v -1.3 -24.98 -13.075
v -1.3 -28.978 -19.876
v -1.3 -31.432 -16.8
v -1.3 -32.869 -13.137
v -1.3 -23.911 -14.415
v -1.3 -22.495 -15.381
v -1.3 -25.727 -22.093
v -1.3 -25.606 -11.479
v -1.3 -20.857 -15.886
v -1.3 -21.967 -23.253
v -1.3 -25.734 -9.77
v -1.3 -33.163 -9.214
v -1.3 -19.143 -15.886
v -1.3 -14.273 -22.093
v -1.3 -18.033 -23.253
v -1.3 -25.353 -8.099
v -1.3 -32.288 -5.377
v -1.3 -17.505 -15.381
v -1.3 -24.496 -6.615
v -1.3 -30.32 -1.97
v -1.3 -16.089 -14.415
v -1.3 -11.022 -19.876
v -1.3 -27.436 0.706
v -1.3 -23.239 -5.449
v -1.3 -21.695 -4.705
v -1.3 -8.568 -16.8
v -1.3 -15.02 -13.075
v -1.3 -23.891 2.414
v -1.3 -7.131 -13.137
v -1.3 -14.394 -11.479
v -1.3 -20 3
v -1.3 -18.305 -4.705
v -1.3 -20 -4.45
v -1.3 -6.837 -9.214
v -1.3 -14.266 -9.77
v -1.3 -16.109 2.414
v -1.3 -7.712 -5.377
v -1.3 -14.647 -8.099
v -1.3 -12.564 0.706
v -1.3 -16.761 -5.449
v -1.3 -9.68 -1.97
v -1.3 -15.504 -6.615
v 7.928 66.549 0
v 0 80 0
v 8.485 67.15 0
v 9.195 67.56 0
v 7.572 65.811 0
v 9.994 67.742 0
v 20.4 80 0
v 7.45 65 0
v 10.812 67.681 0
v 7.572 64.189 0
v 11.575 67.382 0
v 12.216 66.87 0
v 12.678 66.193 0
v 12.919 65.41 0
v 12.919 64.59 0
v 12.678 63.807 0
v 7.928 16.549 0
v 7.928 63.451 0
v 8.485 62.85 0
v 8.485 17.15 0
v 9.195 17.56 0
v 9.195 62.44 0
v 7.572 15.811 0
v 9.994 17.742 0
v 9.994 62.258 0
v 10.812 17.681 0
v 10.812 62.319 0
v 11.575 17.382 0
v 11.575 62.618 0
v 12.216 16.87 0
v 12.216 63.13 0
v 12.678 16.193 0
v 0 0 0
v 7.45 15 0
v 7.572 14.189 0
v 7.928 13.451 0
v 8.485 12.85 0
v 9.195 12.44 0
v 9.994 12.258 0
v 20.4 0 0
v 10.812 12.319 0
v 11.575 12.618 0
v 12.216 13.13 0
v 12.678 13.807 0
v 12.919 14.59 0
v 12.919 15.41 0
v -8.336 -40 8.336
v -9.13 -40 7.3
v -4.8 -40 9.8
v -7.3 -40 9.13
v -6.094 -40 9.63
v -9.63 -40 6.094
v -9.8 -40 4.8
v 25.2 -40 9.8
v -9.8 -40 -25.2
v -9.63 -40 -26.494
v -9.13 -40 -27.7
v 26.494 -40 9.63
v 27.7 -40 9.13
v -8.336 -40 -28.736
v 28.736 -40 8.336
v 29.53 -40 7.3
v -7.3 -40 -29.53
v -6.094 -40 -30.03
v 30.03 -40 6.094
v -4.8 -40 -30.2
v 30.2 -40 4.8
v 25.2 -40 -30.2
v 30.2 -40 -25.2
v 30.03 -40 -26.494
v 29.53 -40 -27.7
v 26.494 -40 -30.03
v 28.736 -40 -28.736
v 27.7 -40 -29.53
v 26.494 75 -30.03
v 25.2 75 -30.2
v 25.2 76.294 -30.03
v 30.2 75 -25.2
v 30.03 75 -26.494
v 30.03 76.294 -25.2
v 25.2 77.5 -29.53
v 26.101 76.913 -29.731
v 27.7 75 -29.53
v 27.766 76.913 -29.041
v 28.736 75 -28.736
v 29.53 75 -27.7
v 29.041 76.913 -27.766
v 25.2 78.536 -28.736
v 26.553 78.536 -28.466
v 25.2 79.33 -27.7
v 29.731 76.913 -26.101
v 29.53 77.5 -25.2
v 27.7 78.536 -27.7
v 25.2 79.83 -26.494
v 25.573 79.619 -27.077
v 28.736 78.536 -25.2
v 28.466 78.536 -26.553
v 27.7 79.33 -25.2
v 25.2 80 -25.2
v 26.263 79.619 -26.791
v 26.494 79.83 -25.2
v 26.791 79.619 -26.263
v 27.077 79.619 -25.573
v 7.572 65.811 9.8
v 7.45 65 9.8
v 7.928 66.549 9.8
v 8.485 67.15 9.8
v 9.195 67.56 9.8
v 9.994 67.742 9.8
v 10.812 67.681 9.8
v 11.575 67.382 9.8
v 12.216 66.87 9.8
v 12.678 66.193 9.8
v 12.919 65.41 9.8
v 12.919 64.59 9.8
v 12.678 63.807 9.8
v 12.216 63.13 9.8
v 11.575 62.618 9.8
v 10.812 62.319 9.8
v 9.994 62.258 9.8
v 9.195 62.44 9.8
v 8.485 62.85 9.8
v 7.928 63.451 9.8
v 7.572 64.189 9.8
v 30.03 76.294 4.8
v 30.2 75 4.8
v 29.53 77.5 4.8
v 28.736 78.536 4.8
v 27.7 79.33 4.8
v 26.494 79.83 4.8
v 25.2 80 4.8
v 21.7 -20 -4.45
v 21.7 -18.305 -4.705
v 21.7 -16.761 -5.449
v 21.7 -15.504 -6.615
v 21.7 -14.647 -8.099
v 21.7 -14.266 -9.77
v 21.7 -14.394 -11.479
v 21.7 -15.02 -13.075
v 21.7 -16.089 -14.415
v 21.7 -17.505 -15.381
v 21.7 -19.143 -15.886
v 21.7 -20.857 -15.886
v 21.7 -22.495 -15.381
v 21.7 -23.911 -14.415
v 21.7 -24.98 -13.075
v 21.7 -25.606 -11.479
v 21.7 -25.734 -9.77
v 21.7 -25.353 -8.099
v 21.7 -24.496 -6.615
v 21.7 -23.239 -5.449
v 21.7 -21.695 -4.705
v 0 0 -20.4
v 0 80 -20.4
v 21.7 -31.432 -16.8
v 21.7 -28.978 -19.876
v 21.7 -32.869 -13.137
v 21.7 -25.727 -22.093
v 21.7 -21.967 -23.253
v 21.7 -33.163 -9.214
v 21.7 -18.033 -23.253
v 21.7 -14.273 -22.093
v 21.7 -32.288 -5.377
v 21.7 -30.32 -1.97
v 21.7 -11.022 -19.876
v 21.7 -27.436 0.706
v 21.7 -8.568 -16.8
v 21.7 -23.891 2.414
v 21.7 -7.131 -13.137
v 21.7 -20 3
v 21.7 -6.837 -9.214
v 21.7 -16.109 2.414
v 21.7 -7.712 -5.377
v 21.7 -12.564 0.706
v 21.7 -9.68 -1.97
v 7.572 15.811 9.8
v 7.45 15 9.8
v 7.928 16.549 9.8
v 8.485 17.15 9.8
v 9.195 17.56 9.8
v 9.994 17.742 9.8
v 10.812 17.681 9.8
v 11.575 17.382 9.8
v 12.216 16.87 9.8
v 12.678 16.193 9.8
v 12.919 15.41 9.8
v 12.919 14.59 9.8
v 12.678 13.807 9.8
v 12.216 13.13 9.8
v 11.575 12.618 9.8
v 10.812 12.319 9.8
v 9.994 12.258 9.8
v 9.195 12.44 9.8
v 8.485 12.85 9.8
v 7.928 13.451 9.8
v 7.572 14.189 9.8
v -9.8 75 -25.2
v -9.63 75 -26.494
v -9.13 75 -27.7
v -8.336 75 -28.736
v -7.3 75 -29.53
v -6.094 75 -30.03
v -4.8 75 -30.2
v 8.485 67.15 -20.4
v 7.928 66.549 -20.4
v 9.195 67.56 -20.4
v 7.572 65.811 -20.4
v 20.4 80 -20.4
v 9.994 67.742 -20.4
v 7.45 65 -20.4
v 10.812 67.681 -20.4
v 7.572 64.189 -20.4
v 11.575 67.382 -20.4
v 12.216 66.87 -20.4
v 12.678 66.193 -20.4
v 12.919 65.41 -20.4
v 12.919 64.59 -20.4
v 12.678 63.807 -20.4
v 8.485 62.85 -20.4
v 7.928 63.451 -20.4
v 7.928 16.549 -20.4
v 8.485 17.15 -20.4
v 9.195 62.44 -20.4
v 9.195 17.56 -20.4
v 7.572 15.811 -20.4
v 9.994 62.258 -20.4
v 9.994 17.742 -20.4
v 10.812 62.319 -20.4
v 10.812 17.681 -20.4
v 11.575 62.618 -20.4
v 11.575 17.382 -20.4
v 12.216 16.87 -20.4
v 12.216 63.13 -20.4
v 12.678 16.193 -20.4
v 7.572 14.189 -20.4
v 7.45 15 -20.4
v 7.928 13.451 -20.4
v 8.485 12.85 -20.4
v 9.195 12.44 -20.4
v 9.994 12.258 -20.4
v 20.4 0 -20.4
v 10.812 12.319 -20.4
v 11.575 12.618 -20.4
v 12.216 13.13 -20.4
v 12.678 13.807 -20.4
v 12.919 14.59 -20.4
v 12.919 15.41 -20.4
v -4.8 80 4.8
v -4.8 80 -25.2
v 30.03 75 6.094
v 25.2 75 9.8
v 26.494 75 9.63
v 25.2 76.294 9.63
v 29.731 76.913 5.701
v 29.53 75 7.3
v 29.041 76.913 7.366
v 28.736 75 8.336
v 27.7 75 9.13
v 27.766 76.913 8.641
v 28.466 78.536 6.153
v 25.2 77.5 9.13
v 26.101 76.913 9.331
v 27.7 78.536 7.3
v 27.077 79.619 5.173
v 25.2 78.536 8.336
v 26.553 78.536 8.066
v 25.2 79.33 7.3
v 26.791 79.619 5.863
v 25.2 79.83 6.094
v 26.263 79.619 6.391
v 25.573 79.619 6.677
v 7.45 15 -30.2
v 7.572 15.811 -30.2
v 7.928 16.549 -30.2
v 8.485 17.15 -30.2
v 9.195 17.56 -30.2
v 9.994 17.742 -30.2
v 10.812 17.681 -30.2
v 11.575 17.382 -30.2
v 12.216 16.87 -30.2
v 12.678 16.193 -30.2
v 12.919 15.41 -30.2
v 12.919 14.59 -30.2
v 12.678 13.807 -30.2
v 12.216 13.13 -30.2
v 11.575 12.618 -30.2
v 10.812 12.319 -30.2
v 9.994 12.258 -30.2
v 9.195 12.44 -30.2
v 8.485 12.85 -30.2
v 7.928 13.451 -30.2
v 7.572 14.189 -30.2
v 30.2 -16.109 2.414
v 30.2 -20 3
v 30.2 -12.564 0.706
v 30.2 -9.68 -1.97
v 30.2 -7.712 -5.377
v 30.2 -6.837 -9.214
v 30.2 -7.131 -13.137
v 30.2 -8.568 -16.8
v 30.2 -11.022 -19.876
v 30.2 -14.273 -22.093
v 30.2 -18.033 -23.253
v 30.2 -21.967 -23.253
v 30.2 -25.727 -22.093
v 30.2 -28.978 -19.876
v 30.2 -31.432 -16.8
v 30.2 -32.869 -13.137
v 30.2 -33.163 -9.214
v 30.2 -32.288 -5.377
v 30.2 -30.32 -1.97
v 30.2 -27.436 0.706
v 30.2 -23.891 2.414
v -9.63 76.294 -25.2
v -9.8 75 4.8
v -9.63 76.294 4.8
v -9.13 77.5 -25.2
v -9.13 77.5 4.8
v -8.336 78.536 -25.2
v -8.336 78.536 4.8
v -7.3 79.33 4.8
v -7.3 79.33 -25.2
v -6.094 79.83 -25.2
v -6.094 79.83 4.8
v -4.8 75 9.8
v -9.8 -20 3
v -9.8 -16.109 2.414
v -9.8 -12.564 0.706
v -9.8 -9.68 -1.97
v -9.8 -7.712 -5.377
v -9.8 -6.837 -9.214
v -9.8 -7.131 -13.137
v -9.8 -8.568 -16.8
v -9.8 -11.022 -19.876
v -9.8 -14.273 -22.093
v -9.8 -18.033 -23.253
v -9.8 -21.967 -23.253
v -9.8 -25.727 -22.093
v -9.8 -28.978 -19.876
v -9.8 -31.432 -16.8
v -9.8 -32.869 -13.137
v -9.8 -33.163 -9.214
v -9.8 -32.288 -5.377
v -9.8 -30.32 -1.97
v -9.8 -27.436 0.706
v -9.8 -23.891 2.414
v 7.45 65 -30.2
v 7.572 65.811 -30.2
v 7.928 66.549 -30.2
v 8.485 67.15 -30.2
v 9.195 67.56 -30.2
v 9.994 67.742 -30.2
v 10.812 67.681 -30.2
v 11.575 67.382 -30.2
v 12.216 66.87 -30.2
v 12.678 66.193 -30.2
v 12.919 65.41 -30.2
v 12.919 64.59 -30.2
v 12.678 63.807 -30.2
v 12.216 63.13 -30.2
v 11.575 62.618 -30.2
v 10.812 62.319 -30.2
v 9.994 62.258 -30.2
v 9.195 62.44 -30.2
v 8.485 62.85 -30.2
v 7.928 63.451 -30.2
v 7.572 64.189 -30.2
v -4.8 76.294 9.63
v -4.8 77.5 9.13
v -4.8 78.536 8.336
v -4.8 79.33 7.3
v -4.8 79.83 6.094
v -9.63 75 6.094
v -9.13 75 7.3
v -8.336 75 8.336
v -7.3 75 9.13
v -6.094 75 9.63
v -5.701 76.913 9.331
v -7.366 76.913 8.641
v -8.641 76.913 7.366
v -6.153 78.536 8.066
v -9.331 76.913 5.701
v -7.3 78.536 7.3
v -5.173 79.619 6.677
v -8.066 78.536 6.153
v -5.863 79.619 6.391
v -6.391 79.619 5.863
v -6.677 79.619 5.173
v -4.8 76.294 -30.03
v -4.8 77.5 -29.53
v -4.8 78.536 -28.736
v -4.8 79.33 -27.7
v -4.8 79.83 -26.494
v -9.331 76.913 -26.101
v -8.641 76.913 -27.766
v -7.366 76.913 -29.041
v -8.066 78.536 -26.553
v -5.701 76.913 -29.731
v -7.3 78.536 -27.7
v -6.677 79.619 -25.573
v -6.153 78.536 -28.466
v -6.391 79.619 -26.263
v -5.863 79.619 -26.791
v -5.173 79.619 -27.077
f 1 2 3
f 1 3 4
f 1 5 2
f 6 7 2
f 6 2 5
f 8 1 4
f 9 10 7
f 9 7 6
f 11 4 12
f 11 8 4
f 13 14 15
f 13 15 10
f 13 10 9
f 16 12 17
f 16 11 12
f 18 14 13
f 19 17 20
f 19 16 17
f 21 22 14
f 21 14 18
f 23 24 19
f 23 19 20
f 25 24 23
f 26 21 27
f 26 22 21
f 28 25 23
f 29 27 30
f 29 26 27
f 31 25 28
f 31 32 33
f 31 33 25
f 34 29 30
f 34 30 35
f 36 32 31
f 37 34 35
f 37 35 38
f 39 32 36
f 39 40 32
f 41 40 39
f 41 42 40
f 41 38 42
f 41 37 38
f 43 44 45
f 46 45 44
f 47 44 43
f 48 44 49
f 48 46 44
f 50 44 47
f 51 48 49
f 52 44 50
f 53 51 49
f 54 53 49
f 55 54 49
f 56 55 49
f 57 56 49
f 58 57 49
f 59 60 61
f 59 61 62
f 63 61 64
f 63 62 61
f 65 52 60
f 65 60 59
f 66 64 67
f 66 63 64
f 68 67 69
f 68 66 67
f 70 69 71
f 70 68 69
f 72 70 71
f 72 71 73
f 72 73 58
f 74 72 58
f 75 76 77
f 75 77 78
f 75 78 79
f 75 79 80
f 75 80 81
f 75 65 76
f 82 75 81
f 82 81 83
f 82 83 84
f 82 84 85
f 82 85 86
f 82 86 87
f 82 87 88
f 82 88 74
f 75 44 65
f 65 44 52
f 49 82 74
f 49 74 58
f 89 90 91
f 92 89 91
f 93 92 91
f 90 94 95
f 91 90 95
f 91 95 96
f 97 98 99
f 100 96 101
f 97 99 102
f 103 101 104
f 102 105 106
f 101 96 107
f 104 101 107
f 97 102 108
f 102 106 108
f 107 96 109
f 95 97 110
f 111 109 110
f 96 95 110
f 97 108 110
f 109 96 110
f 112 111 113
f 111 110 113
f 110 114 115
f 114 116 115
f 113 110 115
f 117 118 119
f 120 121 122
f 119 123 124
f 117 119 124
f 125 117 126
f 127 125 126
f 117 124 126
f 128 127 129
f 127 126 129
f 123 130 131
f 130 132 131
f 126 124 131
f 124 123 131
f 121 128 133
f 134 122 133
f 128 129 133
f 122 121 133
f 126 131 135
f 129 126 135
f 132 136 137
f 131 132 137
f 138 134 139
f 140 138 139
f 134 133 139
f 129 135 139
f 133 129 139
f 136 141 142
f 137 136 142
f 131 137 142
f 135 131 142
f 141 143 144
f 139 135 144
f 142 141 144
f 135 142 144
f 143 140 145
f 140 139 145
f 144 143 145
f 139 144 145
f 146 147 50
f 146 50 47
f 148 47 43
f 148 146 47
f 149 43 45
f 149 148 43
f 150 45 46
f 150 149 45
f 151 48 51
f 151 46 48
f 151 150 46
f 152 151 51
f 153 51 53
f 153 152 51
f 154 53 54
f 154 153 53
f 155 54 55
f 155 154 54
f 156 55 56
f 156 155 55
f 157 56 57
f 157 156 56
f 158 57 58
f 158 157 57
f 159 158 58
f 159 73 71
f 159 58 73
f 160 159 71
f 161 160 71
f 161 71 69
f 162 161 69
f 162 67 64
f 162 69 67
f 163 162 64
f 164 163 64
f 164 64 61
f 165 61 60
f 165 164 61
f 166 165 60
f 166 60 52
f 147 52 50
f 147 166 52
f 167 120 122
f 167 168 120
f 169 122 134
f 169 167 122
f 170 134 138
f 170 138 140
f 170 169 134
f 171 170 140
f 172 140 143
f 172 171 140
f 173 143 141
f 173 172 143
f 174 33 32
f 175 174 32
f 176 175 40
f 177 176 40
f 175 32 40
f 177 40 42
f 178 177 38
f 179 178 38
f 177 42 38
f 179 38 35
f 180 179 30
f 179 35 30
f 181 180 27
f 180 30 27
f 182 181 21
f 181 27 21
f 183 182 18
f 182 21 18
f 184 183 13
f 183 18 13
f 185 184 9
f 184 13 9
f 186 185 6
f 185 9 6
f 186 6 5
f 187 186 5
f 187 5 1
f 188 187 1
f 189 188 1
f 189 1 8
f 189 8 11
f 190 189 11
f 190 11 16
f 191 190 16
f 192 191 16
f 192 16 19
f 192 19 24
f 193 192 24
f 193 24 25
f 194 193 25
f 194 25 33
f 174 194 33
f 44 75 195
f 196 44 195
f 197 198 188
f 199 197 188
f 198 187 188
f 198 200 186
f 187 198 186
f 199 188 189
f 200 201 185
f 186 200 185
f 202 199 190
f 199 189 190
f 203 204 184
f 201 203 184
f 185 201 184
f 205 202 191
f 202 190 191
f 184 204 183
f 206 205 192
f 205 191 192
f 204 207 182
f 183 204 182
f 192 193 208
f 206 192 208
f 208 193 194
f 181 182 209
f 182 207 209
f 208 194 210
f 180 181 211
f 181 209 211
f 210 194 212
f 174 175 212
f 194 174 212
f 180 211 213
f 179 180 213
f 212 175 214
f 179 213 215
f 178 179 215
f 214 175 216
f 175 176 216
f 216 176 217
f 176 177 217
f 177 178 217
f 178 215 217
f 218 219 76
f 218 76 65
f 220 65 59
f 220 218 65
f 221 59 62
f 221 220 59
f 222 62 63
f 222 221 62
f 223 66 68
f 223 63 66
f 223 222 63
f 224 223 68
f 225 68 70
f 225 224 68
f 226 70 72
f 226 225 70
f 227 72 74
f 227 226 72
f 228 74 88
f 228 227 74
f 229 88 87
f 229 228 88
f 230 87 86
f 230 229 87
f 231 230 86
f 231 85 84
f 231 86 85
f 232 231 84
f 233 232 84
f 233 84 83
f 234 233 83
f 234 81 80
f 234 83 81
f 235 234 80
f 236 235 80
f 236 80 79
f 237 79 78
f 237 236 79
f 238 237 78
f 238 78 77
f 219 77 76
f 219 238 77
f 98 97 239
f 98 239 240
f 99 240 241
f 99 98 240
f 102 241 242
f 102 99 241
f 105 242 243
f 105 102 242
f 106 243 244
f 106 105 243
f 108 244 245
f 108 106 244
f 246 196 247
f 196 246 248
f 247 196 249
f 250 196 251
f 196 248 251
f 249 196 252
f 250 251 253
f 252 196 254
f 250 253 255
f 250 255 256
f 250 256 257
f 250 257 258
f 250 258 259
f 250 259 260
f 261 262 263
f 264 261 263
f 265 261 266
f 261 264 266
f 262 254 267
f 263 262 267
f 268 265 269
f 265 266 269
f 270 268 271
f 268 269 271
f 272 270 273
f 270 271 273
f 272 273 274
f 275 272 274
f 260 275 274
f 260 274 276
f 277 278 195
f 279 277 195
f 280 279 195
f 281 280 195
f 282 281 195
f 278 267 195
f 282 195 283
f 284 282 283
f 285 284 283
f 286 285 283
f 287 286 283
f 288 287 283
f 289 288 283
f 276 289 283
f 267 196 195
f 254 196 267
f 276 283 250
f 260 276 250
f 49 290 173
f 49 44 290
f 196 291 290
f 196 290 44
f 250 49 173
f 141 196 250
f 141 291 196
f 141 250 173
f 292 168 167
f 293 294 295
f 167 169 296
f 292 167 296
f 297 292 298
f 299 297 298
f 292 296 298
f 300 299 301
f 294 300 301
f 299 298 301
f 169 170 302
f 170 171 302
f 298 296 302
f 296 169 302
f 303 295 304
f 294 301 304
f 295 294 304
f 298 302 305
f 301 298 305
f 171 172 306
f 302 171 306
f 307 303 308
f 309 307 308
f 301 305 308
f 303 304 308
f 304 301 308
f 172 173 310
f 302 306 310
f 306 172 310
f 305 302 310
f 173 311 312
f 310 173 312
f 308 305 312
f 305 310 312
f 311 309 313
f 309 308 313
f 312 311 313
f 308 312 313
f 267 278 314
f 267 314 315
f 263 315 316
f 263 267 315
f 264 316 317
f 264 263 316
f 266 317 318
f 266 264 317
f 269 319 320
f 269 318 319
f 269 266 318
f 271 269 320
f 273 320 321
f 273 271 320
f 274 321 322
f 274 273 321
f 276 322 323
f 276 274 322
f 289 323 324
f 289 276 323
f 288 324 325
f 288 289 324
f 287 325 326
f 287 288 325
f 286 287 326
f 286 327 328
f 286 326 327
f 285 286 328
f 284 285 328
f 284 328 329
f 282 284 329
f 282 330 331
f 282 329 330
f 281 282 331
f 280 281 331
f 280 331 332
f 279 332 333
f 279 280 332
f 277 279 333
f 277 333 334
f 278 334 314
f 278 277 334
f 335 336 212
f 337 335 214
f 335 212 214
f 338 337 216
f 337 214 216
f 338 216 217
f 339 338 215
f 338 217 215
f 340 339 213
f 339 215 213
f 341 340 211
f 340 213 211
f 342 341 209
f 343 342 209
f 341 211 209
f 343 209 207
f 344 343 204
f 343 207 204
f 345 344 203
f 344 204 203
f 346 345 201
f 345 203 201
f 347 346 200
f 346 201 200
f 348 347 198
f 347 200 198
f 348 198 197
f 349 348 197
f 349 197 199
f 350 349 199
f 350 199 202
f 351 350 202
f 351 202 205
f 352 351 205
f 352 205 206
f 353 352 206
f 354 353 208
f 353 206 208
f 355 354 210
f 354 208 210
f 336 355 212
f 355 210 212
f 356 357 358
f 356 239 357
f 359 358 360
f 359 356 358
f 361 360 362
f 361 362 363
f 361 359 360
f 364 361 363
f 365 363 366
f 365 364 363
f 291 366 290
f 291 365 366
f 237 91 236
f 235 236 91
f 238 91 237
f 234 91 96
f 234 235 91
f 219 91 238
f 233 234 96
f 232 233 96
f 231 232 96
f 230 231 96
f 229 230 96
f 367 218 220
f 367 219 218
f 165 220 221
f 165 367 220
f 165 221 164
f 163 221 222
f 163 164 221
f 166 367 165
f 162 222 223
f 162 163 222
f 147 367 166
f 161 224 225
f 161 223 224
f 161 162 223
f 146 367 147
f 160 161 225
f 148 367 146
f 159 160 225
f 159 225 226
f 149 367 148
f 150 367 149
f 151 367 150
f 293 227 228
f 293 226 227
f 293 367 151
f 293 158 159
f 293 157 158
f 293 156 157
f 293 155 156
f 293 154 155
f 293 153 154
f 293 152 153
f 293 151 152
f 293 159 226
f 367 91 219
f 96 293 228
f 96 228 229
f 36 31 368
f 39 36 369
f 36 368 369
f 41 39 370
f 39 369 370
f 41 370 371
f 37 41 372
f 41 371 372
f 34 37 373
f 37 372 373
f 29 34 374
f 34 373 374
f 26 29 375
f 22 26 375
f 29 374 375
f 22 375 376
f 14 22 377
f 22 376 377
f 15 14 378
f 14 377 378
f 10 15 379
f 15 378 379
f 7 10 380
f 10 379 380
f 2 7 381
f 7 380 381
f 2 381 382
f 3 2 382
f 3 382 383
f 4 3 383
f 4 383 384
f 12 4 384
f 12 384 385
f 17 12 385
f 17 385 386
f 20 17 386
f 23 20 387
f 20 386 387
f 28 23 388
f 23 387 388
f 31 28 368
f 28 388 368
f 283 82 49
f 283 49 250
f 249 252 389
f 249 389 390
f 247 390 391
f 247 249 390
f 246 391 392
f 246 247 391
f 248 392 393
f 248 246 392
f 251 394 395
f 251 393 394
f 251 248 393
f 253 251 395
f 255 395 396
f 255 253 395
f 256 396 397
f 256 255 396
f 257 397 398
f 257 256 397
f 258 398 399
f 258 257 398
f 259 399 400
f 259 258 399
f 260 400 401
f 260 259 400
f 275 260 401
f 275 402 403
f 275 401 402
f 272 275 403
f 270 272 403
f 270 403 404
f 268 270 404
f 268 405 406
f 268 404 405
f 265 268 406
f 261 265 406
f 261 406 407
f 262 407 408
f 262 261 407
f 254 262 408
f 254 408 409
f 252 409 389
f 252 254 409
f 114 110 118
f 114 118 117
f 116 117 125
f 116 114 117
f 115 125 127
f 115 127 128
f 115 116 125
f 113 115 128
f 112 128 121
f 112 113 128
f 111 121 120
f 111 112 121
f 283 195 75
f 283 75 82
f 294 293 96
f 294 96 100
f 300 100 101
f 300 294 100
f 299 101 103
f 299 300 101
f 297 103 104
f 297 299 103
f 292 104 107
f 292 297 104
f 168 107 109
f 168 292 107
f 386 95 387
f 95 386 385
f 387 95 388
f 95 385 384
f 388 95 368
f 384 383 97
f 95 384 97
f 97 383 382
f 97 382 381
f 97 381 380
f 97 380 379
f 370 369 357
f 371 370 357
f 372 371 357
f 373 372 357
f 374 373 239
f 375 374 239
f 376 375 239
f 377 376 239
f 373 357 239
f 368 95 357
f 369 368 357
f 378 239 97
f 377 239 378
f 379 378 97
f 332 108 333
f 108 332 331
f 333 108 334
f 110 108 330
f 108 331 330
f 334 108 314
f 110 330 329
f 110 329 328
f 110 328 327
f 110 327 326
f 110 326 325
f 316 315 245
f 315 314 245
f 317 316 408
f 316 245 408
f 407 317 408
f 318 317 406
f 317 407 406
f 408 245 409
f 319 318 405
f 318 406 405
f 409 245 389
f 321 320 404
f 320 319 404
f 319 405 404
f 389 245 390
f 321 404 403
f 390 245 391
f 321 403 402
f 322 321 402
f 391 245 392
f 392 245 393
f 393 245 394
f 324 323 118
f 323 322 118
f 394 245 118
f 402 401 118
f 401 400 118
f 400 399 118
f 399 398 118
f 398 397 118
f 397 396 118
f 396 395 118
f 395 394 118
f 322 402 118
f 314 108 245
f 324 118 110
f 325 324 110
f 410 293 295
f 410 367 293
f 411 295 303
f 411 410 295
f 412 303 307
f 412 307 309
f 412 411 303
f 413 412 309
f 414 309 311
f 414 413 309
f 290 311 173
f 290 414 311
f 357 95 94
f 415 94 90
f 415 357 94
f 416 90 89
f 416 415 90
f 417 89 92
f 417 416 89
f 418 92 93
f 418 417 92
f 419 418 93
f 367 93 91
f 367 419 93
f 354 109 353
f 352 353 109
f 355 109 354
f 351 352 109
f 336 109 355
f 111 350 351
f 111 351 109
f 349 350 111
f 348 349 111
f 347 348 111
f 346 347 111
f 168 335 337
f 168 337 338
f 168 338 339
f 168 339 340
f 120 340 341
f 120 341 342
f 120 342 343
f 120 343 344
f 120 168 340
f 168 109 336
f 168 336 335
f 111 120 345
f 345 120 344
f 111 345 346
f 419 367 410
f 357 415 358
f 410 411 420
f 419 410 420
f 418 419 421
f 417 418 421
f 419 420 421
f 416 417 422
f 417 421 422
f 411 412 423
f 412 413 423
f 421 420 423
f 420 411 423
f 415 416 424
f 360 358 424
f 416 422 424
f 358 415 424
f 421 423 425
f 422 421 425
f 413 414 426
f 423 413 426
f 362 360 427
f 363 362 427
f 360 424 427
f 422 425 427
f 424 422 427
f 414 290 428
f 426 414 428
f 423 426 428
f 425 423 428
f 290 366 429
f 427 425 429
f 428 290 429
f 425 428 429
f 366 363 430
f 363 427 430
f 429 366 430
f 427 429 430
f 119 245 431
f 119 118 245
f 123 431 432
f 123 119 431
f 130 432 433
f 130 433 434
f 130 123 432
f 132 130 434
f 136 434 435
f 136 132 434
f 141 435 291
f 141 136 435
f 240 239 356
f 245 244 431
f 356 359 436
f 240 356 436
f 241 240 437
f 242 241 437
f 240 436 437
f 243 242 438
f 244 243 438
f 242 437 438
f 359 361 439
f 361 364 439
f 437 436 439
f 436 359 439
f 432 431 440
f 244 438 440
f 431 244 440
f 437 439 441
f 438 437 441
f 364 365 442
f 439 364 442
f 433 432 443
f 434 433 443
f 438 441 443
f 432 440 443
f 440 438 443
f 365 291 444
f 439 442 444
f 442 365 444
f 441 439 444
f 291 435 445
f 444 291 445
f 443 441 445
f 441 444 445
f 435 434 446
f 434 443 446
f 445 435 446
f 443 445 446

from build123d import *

# Parameters (mm, degrees)
SKETCH1_W               = 40
SKETCH1_H               = 40
SKETCH1_W_2             = 20.4
SKETCH1_H_2             = 20.4
BOSS_EXTRUDE1_DEPTH     = 80
SKETCH1_2_W             = 40
SKETCH1_2_H             = 40
SKETCH1_2_W_2           = 20.4
SKETCH1_2_H_2           = 20.4
BOSS_EXTRUDE2_DEPTH     = 40
CUT_EXTRUDE1_DEPTH      = 91.68671347
CUT_EXTRUDE1_DEPTH_BACK = 91.68671347
SKETCH2_R               = 2.75
SKETCH3_R               = 13.2
SKETCH3_R_2             = 5.75
CUT_EXTRUDE2_DEPTH      = 8.5
CUT_EXTRUDE3_START      = -31.5
SKETCH3_3_R             = 13.2
SKETCH3_3_R_2           = 5.75
CUT_EXTRUDE3_DEPTH      = 8.5
SKETCH3_4_R             = 5.75
CUT_EXTRUDE4_DEPTH      = 95.403601626
FILLET1_R               = 5
FILLET2_R               = 5


with BuildPart() as part:
    # Sketch1 → Boss-Extrude1 (new body)
    with BuildSketch(Plane(origin=(0, 0, 0), x_dir=(1, 0, 0), z_dir=(0, 1, 0))):
        with Locations((10.2, 10.2)):
            Rectangle(SKETCH1_W, SKETCH1_H)
        with Locations((10.2, 10.2)):
            Rectangle(SKETCH1_W_2, SKETCH1_H_2, mode=Mode.SUBTRACT)
    extrude(amount=BOSS_EXTRUDE1_DEPTH)

    # Sketch1<2> → Boss-Extrude2 (add)
    # profile 1 of 2: a face of its own
    with BuildSketch(Plane(origin=(0, 0, 0), x_dir=(1, 0, 0), z_dir=(0, 1, 0))):
        with Locations((10.2, 10.2)):
            Rectangle(SKETCH1_2_W, SKETCH1_2_H)
        with Locations((10.2, 10.2)):
            Rectangle(SKETCH1_2_W_2, SKETCH1_2_H_2, mode=Mode.SUBTRACT)
    # profile 2 of 2: a face of its own
    with BuildSketch(Plane(origin=(0, 0, 0), x_dir=(1, 0, 0), z_dir=(0, 1, 0))):
        with Locations((10.2, 10.2)):
            Rectangle(SKETCH1_2_W_2, SKETCH1_2_H_2)
    extrude(amount=-BOSS_EXTRUDE2_DEPTH)

    # Sketch2 → Cut-Extrude1 (cut, two sides: drawn at the far end of the back side and taken through both)
    with BuildSketch(Plane(origin=(0, 0, 0), x_dir=(-1, 0, 0), z_dir=(0, 0, -1)).offset(-CUT_EXTRUDE1_DEPTH_BACK)):
        with Locations((-10.2, 15)):
            Circle(SKETCH2_R)
        with Locations((-10.2, 65)):
            Circle(SKETCH2_R)
    extrude(amount=CUT_EXTRUDE1_DEPTH + CUT_EXTRUDE1_DEPTH_BACK, mode=Mode.SUBTRACT)

    # Sketch3 → Cut-Extrude2 (cut)
    with BuildSketch(Plane.ZY.offset(9.8)):
        with Locations((-10.2, -20)):
            Circle(SKETCH3_R)
        with Locations((-10.2, -20)):
            Circle(SKETCH3_R_2, mode=Mode.SUBTRACT)
    extrude(amount=-CUT_EXTRUDE2_DEPTH, mode=Mode.SUBTRACT)

    # Sketch3<3> → Cut-Extrude3 (cut)
    with BuildSketch(Plane.ZY.offset(9.8).offset(CUT_EXTRUDE3_START)):
        with Locations((-10.2, -20)):
            Circle(SKETCH3_3_R)
        with Locations((-10.2, -20)):
            Circle(SKETCH3_3_R_2, mode=Mode.SUBTRACT)
    extrude(amount=-CUT_EXTRUDE3_DEPTH, mode=Mode.SUBTRACT)

    # Sketch3<4> → Cut-Extrude4 (cut, through all)
    with BuildSketch(Plane.ZY.offset(9.8)):
        with Locations((-10.2, -20)):
            Circle(SKETCH3_4_R)
    extrude(amount=-CUT_EXTRUDE4_DEPTH, mode=Mode.SUBTRACT)

    # Fillet1
    fillet1_edges = [part.edges().sort_by_distance(p)[0] for p in [
        (-9.8, 20, -30.2),
        (30.2, 20, -30.2),
        (30.2, 20, 9.8),
        (-9.8, 20, 9.8),
    ]]
    fillet(fillet1_edges, radius=FILLET1_R)

    # Fillet2
    fillet2_edges = [part.edges().sort_by_distance(p)[0] for p in [
        (-9.8, 80, -10.2),
        (10.2, 80, -30.2),
        (10.2, 80, 9.8),
        (30.2, 80, -10.2),
        (28.735533906, 80, -28.735533906),
        (28.735533906, 80, 8.335533906),
        (-8.335533906, 80, 8.335533906),
        (-8.335533906, 80, -28.735533906),
    ]]
    fillet(fillet2_edges, radius=FILLET2_R)


solid = part.part
